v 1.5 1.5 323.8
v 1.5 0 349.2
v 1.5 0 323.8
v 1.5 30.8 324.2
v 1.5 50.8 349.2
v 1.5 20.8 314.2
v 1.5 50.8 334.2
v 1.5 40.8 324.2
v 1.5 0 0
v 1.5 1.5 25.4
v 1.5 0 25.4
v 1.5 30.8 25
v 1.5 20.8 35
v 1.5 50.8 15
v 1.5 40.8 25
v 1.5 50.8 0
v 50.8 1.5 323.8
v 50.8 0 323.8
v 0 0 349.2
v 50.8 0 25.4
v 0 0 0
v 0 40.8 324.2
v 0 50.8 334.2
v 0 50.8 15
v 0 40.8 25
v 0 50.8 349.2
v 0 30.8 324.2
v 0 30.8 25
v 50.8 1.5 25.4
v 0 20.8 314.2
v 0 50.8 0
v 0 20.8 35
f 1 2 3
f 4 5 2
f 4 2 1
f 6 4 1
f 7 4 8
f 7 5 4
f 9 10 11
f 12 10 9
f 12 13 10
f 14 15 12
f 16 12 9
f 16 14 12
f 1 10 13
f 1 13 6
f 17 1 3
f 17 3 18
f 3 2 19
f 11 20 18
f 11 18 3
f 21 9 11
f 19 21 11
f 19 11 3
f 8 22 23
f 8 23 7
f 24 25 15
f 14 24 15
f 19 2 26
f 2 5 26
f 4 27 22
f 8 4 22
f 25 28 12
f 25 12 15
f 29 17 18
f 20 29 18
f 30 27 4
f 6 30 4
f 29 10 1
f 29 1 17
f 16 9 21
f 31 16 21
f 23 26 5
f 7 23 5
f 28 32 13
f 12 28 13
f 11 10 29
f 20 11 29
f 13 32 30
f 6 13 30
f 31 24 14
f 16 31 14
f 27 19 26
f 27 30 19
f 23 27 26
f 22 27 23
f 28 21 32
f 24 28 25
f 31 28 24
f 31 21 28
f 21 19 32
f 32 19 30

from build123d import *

# Parameters (mm, degrees)
SALIENTE_EXTRUIR1_DEPTH = 349.2
CROQUIS2_R              = 4
CORTAR_EXTRUIR1_DEPTH   = 2
CROQUIS4_W              = 49.3
CROQUIS4_H              = 25.4
CORTAR_EXTRUIR2_DEPTH   = 2
CROQUIS5_W              = 299.2
CROQUIS5_H              = 30
CORTAR_EXTRUIR3_DEPTH   = 2
CHAFL_N1_SIZE           = 10


with BuildPart() as part:
    # Croquis1 → Saliente-Extruir1 (new body)
    with BuildSketch(Plane.XY):
        Polygon((0, 0), (0, 50.8), (1.5, 50.8), (1.5, 1.5), (50.8, 1.5), (50.8, 0), align=None)
    extrude(amount=SALIENTE_EXTRUIR1_DEPTH)

    # Croquis2 → Cortar-Extruir1 (cut)
    with BuildSketch(Plane.ZY):
        with Locations((126.6, 25.4)):
            Circle(CROQUIS2_R)
        with Locations((222.6, 25.4)):
            Circle(CROQUIS2_R)
        with Locations((30.6, 25.4)):
            Circle(CROQUIS2_R)
        with Locations((318.6, 25.4)):
            Circle(CROQUIS2_R)
    extrude(amount=-CORTAR_EXTRUIR1_DEPTH, mode=Mode.SUBTRACT)

    # Croquis4 → Cortar-Extruir2 (cut)
    with BuildSketch(Plane(origin=(0, 1.5, 0), x_dir=(1, 0, 0), z_dir=(0, 1, 0))):
        with Locations((26.15, -12.7)):
            Rectangle(CROQUIS4_W, CROQUIS4_H)
        with Locations((26.15, -336.5)):
            Rectangle(CROQUIS4_W, CROQUIS4_H)
    extrude(amount=-CORTAR_EXTRUIR2_DEPTH, mode=Mode.SUBTRACT)

    # Croquis5 → Cortar-Extruir3 (cut)
    with BuildSketch(Plane.ZY):
        with Locations((174.6, 35.8)):
            Rectangle(CROQUIS5_W, CROQUIS5_H)
    extrude(amount=-CORTAR_EXTRUIR3_DEPTH, mode=Mode.SUBTRACT)

    # Chaflán1
    chafl_n1_edges = [part.edges().sort_by_distance(p)[0] for p in [
        (0.75, 50.8, 25),
        (0.75, 50.8, 324.2),
        (0.75, 20.8, 324.2),
        (0.75, 20.8, 25),
    ]]
    chamfer(chafl_n1_edges, length=CHAFL_N1_SIZE)


solid = part.part
